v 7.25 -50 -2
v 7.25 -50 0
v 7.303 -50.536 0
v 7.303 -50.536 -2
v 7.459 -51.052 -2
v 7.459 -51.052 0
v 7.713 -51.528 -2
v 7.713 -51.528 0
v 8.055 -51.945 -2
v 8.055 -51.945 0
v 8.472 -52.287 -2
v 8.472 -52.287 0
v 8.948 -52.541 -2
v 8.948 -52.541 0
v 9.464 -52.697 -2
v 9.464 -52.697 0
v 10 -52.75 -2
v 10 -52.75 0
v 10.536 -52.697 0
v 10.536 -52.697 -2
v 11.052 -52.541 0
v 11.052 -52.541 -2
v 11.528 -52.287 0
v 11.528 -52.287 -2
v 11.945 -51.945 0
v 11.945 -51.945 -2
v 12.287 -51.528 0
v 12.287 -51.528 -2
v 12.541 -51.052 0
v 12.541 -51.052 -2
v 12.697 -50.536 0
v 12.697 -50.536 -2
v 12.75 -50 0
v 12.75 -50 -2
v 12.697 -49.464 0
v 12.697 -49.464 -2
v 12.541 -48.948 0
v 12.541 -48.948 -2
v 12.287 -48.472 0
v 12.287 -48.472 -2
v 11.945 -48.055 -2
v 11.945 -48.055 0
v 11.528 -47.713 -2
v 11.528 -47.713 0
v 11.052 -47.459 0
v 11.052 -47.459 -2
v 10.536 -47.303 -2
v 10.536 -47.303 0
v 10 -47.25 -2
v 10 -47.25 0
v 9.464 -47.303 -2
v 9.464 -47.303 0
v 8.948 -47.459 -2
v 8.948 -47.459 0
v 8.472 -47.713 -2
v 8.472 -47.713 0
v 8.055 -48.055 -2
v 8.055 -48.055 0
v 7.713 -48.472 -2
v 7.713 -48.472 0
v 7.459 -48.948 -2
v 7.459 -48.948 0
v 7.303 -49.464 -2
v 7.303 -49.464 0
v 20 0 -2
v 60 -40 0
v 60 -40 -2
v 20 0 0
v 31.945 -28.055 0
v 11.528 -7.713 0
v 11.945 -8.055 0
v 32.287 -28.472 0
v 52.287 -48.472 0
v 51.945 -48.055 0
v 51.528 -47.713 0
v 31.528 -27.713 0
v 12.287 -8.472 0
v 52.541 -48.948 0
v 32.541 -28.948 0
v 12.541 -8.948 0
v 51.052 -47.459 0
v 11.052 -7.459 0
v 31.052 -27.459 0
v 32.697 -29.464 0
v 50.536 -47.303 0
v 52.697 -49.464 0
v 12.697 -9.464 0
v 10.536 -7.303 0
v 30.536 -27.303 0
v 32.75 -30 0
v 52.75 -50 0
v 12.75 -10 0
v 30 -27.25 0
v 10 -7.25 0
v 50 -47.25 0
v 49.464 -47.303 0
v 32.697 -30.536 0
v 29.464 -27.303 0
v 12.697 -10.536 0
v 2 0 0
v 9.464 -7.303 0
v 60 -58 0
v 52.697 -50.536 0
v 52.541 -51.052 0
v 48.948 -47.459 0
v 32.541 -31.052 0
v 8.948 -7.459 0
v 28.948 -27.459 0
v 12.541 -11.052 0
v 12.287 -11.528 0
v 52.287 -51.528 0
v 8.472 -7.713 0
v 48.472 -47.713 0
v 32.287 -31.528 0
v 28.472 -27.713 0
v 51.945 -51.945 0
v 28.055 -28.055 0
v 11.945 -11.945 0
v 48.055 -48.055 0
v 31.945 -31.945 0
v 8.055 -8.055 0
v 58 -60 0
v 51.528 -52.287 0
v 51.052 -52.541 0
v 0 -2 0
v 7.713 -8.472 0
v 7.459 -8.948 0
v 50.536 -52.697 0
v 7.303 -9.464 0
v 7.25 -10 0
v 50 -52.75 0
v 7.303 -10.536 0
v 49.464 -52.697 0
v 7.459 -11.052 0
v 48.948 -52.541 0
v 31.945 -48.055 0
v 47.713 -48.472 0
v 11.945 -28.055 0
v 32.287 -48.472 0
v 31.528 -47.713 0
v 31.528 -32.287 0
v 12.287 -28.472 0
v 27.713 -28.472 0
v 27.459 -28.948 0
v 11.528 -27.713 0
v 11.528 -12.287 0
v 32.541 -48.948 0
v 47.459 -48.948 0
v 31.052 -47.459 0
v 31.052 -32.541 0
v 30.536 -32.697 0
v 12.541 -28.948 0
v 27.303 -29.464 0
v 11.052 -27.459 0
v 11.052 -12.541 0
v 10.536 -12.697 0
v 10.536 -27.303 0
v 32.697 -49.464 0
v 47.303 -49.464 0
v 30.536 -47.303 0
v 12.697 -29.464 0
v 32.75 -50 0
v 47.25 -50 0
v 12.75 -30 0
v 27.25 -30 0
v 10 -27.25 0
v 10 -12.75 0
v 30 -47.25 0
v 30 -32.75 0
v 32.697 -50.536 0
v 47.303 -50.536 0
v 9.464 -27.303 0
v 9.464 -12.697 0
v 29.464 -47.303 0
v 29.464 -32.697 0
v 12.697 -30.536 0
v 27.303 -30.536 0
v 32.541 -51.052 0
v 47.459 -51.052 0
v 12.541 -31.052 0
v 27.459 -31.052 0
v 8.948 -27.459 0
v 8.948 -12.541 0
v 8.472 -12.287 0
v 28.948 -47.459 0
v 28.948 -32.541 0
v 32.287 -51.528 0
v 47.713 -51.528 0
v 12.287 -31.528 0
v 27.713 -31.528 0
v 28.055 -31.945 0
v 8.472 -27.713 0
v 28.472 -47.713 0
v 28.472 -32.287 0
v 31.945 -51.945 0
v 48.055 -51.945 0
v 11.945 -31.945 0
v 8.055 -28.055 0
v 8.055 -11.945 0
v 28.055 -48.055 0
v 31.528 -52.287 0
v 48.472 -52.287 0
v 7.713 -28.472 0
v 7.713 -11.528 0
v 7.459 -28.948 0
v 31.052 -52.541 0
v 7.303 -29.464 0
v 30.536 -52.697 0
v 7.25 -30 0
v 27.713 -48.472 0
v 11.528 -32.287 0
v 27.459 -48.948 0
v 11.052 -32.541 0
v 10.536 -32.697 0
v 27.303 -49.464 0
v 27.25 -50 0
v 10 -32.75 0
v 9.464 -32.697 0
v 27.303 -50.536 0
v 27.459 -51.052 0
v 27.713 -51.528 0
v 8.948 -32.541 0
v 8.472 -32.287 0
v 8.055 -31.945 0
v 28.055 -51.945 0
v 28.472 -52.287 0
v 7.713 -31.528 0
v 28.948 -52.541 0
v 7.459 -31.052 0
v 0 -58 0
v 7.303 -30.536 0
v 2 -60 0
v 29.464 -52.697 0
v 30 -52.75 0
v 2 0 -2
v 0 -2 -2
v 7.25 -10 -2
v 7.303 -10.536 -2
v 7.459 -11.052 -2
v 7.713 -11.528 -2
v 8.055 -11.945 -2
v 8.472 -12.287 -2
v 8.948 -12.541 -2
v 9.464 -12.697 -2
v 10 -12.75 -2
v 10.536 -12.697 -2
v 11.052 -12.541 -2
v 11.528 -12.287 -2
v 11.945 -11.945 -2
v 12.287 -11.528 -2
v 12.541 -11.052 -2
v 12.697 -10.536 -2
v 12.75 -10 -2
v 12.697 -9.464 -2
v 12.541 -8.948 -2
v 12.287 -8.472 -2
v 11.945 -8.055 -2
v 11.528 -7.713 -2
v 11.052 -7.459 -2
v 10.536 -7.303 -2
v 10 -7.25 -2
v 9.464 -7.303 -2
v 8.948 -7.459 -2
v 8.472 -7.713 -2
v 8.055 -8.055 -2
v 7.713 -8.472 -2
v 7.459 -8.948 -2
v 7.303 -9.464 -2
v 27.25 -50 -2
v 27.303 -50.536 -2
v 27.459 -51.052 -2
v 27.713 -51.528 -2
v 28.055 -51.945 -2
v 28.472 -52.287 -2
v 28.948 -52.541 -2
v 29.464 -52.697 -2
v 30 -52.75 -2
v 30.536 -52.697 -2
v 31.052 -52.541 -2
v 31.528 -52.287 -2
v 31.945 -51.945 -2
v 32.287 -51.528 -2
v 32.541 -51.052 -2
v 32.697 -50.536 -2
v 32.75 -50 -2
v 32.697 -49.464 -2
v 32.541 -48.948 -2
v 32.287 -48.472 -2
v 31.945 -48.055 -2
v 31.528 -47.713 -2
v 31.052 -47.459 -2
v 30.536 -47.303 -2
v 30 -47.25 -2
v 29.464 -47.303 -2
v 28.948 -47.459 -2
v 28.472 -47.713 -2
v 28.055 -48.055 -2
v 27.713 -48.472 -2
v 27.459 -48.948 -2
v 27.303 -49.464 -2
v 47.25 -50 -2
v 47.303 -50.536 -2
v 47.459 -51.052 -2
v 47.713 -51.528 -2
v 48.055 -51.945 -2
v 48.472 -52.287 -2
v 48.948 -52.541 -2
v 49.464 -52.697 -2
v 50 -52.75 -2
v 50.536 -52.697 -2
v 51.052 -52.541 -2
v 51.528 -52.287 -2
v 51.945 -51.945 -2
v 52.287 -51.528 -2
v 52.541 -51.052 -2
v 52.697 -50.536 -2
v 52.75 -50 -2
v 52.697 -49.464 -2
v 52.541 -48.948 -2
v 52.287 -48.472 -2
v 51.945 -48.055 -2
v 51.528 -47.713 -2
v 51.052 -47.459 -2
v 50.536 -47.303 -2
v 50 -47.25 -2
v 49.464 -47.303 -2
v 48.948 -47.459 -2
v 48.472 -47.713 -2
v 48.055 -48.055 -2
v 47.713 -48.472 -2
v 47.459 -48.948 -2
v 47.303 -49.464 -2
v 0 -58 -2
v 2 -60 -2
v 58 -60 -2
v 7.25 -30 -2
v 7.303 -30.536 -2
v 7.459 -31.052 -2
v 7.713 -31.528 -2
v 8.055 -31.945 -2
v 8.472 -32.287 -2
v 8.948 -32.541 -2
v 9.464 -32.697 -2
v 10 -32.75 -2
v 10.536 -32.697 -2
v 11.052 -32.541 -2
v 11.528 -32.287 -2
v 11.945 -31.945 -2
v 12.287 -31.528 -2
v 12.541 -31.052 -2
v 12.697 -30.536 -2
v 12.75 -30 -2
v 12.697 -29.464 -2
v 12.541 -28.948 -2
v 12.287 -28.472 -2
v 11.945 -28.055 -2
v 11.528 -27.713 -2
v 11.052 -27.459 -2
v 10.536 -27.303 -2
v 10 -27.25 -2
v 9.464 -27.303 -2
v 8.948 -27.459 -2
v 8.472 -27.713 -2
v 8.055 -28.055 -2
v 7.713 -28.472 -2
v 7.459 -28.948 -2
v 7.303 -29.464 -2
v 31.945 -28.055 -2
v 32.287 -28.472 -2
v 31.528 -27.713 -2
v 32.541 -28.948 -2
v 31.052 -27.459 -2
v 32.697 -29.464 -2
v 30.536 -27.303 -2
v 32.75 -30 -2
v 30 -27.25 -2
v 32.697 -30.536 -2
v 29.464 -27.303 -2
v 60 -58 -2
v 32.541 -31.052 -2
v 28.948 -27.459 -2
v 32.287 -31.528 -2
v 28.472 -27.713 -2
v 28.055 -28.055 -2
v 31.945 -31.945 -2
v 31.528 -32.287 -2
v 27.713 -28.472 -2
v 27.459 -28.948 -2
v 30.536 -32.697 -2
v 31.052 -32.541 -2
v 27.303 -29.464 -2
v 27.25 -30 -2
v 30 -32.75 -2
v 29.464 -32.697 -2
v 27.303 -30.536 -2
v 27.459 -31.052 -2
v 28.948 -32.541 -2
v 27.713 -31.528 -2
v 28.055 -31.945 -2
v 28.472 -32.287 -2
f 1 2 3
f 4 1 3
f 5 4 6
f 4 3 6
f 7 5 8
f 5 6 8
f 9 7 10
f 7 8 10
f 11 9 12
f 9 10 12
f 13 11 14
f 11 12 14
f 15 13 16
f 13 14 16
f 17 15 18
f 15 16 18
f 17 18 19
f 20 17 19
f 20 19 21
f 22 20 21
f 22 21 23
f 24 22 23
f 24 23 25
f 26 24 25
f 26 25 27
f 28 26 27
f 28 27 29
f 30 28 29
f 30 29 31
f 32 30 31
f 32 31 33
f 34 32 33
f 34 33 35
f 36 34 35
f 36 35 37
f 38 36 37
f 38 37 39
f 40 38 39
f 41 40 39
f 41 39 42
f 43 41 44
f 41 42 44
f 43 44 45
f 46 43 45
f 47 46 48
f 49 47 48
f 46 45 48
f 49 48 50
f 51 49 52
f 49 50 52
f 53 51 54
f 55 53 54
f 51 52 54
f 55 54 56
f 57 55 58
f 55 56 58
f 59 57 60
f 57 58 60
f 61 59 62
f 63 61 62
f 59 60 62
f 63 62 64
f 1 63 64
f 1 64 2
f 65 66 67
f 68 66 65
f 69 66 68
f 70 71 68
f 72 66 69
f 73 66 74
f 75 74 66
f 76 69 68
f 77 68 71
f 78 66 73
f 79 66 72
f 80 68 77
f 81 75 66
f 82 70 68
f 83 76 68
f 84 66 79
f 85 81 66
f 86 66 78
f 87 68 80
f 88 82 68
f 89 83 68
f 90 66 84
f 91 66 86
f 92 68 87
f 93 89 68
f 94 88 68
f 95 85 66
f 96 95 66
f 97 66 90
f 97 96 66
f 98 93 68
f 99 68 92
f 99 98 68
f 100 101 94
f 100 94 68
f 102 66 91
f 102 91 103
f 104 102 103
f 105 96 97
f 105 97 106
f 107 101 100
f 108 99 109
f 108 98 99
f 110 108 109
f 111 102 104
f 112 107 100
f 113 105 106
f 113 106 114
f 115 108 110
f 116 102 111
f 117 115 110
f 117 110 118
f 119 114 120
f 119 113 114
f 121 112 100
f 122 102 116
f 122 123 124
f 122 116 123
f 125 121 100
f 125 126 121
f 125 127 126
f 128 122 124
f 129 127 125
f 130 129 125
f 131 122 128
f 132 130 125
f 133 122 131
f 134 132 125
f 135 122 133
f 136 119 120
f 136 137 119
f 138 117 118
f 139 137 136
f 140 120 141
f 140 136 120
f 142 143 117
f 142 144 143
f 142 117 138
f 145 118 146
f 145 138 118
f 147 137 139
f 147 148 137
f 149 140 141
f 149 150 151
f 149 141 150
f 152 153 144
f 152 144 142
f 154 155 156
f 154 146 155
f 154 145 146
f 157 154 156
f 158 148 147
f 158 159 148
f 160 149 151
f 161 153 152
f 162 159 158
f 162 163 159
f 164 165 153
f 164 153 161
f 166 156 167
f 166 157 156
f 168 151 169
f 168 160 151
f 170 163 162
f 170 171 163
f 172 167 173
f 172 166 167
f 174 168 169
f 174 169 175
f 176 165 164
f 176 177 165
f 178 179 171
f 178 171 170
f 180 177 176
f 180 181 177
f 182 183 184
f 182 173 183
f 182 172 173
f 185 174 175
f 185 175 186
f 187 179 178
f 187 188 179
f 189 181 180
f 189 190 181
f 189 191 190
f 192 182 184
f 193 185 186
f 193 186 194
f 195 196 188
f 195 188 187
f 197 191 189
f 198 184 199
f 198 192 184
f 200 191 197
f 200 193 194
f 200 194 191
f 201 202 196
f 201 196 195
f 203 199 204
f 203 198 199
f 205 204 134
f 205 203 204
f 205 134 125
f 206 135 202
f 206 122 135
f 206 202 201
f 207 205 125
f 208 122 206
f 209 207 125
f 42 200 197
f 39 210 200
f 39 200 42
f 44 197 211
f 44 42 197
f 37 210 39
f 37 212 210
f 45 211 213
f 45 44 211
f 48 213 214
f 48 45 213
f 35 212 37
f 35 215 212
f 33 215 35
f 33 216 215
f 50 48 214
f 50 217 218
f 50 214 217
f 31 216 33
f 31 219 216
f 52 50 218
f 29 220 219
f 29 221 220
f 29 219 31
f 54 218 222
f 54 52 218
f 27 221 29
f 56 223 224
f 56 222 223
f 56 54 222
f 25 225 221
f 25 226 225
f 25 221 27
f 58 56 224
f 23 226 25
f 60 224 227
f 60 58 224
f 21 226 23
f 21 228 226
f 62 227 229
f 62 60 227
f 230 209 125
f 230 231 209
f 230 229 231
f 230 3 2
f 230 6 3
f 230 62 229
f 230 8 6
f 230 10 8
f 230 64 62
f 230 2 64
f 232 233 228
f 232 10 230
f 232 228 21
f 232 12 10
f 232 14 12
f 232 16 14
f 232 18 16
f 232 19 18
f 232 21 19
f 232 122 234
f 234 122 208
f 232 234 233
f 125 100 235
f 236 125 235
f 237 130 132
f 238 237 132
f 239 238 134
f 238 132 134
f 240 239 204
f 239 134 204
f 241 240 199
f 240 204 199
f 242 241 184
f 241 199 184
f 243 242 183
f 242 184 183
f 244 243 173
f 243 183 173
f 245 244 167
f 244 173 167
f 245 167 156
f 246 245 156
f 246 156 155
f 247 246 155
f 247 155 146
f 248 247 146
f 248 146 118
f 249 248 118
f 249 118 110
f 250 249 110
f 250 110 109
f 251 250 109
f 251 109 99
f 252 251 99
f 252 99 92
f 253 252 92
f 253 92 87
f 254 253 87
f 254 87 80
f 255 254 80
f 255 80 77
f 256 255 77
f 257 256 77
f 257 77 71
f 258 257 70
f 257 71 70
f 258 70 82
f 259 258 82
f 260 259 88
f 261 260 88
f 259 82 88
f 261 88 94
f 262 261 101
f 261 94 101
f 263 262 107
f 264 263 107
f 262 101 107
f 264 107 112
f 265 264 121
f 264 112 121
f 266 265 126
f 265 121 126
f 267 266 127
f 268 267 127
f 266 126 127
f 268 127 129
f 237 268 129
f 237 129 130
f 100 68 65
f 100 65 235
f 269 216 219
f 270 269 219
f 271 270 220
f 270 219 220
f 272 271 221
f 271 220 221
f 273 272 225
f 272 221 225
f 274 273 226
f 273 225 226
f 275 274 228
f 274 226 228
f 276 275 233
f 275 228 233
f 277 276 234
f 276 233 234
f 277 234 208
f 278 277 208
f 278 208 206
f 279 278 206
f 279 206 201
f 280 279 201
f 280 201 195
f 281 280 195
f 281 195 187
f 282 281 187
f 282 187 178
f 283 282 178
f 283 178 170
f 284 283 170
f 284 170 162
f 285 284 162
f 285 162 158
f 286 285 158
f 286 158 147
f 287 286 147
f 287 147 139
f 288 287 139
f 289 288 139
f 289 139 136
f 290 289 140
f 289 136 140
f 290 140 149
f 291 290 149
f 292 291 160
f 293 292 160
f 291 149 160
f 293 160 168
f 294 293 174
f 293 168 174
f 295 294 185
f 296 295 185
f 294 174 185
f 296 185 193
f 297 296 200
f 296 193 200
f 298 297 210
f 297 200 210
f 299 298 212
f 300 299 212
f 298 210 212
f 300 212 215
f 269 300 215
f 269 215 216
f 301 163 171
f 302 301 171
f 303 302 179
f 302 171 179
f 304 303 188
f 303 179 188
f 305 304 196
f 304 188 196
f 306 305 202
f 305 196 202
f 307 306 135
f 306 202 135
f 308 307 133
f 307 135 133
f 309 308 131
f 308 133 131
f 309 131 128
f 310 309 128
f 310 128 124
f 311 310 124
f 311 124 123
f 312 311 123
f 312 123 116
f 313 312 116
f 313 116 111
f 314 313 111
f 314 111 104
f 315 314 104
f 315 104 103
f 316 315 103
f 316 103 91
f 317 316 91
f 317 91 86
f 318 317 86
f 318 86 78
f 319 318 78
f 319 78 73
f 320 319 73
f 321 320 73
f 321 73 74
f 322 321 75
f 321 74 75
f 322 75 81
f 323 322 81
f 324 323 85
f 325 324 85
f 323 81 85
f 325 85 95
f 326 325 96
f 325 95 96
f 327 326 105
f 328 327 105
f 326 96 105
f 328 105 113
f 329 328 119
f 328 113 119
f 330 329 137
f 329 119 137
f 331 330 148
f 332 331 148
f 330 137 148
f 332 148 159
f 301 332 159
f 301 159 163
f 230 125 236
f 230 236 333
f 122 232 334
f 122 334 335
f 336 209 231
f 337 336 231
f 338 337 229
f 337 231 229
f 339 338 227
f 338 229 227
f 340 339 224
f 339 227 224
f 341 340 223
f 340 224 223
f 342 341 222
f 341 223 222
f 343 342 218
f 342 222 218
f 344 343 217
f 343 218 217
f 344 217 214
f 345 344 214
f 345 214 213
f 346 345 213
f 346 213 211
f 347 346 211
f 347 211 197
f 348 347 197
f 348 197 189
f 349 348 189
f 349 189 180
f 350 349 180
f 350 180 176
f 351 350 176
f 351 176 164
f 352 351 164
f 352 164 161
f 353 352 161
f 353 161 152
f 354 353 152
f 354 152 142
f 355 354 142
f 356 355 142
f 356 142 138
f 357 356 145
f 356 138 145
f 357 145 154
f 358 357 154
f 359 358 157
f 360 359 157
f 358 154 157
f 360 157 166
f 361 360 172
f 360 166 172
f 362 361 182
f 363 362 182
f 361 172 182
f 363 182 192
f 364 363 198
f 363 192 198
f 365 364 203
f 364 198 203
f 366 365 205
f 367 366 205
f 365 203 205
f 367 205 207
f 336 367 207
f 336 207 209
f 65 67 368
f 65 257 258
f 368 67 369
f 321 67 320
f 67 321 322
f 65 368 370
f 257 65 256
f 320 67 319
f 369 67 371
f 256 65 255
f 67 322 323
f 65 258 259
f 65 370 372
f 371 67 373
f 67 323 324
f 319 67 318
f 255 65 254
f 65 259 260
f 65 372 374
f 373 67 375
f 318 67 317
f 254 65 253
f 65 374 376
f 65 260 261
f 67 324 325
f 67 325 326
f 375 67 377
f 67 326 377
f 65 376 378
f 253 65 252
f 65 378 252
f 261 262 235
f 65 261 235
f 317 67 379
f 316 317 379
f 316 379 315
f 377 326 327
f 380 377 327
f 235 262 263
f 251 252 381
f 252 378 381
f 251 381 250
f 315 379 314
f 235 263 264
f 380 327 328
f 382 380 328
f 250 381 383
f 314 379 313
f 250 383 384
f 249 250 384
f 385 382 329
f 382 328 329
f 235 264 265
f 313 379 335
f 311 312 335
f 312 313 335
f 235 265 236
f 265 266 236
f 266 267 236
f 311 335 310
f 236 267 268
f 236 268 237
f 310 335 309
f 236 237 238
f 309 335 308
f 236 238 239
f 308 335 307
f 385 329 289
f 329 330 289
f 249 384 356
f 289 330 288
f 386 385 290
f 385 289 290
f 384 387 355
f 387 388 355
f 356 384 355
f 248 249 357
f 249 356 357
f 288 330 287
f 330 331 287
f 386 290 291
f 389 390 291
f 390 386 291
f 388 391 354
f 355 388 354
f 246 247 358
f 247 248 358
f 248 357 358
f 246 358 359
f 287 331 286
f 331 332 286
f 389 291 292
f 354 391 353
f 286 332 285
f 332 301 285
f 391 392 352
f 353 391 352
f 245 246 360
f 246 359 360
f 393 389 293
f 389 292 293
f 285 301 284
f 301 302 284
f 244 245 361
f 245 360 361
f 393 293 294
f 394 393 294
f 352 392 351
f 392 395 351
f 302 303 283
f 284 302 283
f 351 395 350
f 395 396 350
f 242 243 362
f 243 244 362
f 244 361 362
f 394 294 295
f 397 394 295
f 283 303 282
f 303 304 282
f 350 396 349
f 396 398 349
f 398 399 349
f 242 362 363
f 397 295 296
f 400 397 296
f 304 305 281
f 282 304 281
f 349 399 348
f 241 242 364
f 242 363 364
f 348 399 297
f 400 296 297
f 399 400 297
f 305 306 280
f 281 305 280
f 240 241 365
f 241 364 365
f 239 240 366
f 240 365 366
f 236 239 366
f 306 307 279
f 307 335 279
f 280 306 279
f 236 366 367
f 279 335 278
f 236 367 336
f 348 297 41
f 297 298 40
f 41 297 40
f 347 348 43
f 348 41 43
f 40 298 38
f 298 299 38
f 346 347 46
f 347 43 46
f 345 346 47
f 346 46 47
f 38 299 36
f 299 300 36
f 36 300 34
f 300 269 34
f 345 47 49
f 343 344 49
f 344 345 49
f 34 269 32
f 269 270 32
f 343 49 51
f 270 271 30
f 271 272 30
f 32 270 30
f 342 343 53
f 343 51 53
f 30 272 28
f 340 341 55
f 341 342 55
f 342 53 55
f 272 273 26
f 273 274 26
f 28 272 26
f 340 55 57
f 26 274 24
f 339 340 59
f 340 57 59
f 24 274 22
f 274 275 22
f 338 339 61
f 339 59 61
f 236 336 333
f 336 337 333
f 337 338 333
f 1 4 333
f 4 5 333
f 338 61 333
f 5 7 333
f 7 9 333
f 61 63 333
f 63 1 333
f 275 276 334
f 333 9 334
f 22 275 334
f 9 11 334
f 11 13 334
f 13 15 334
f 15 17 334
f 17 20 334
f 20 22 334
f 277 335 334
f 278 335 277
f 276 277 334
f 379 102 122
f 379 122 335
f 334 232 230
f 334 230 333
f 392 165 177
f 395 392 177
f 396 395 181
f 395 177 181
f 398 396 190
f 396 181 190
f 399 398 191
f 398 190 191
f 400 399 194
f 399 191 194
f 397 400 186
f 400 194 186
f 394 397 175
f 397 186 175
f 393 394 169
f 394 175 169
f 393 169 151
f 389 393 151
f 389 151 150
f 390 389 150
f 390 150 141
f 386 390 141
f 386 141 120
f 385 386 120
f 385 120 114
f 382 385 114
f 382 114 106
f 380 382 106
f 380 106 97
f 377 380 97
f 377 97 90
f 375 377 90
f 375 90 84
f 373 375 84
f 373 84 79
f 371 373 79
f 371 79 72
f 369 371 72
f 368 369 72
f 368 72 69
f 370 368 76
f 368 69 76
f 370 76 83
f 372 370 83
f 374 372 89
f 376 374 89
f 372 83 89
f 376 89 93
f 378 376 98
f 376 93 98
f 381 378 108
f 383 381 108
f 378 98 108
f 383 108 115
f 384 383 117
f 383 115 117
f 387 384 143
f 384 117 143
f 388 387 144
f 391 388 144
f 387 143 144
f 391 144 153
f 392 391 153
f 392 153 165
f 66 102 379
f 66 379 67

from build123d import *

# Parameters (mm, degrees)
EXTRUDE_1_DEPTH   = 2
HOLE_WIZARD_M51_D = 5.5
CHAMFER_1_SIZE    = 2


with BuildPart() as part:
    # Эскиз1 → Бобышка-Вытянуть1 (new body)
    with BuildSketch(Plane(origin=(0, 0, 0), x_dir=(1, 0, 0), z_dir=(0, 0, -1))):
        Polygon((0, 0), (0, 60), (60, 60), (60, 40), (20, 0), align=None)
    extrude(amount=EXTRUDE_1_DEPTH)

    # Отверстие с зазором M51 (through all)
    with Locations(Plane(origin=(0, 0, -2), x_dir=(1, 0, 0), z_dir=(0, 0, -1))):
        with Locations((30, 50), (10, 50), (10, 30), (10, 10), (50, 50), (30, 30)):
            Hole(HOLE_WIZARD_M51_D / 2)

    # Фаска1
    chamfer_1_edges = [part.edges().sort_by_distance(p)[0] for p in [
        (0, 0, -1),
        (0, -60, -1),
        (60, -60, -1),
    ]]
    chamfer(chamfer_1_edges, length=CHAMFER_1_SIZE)


solid = part.part
